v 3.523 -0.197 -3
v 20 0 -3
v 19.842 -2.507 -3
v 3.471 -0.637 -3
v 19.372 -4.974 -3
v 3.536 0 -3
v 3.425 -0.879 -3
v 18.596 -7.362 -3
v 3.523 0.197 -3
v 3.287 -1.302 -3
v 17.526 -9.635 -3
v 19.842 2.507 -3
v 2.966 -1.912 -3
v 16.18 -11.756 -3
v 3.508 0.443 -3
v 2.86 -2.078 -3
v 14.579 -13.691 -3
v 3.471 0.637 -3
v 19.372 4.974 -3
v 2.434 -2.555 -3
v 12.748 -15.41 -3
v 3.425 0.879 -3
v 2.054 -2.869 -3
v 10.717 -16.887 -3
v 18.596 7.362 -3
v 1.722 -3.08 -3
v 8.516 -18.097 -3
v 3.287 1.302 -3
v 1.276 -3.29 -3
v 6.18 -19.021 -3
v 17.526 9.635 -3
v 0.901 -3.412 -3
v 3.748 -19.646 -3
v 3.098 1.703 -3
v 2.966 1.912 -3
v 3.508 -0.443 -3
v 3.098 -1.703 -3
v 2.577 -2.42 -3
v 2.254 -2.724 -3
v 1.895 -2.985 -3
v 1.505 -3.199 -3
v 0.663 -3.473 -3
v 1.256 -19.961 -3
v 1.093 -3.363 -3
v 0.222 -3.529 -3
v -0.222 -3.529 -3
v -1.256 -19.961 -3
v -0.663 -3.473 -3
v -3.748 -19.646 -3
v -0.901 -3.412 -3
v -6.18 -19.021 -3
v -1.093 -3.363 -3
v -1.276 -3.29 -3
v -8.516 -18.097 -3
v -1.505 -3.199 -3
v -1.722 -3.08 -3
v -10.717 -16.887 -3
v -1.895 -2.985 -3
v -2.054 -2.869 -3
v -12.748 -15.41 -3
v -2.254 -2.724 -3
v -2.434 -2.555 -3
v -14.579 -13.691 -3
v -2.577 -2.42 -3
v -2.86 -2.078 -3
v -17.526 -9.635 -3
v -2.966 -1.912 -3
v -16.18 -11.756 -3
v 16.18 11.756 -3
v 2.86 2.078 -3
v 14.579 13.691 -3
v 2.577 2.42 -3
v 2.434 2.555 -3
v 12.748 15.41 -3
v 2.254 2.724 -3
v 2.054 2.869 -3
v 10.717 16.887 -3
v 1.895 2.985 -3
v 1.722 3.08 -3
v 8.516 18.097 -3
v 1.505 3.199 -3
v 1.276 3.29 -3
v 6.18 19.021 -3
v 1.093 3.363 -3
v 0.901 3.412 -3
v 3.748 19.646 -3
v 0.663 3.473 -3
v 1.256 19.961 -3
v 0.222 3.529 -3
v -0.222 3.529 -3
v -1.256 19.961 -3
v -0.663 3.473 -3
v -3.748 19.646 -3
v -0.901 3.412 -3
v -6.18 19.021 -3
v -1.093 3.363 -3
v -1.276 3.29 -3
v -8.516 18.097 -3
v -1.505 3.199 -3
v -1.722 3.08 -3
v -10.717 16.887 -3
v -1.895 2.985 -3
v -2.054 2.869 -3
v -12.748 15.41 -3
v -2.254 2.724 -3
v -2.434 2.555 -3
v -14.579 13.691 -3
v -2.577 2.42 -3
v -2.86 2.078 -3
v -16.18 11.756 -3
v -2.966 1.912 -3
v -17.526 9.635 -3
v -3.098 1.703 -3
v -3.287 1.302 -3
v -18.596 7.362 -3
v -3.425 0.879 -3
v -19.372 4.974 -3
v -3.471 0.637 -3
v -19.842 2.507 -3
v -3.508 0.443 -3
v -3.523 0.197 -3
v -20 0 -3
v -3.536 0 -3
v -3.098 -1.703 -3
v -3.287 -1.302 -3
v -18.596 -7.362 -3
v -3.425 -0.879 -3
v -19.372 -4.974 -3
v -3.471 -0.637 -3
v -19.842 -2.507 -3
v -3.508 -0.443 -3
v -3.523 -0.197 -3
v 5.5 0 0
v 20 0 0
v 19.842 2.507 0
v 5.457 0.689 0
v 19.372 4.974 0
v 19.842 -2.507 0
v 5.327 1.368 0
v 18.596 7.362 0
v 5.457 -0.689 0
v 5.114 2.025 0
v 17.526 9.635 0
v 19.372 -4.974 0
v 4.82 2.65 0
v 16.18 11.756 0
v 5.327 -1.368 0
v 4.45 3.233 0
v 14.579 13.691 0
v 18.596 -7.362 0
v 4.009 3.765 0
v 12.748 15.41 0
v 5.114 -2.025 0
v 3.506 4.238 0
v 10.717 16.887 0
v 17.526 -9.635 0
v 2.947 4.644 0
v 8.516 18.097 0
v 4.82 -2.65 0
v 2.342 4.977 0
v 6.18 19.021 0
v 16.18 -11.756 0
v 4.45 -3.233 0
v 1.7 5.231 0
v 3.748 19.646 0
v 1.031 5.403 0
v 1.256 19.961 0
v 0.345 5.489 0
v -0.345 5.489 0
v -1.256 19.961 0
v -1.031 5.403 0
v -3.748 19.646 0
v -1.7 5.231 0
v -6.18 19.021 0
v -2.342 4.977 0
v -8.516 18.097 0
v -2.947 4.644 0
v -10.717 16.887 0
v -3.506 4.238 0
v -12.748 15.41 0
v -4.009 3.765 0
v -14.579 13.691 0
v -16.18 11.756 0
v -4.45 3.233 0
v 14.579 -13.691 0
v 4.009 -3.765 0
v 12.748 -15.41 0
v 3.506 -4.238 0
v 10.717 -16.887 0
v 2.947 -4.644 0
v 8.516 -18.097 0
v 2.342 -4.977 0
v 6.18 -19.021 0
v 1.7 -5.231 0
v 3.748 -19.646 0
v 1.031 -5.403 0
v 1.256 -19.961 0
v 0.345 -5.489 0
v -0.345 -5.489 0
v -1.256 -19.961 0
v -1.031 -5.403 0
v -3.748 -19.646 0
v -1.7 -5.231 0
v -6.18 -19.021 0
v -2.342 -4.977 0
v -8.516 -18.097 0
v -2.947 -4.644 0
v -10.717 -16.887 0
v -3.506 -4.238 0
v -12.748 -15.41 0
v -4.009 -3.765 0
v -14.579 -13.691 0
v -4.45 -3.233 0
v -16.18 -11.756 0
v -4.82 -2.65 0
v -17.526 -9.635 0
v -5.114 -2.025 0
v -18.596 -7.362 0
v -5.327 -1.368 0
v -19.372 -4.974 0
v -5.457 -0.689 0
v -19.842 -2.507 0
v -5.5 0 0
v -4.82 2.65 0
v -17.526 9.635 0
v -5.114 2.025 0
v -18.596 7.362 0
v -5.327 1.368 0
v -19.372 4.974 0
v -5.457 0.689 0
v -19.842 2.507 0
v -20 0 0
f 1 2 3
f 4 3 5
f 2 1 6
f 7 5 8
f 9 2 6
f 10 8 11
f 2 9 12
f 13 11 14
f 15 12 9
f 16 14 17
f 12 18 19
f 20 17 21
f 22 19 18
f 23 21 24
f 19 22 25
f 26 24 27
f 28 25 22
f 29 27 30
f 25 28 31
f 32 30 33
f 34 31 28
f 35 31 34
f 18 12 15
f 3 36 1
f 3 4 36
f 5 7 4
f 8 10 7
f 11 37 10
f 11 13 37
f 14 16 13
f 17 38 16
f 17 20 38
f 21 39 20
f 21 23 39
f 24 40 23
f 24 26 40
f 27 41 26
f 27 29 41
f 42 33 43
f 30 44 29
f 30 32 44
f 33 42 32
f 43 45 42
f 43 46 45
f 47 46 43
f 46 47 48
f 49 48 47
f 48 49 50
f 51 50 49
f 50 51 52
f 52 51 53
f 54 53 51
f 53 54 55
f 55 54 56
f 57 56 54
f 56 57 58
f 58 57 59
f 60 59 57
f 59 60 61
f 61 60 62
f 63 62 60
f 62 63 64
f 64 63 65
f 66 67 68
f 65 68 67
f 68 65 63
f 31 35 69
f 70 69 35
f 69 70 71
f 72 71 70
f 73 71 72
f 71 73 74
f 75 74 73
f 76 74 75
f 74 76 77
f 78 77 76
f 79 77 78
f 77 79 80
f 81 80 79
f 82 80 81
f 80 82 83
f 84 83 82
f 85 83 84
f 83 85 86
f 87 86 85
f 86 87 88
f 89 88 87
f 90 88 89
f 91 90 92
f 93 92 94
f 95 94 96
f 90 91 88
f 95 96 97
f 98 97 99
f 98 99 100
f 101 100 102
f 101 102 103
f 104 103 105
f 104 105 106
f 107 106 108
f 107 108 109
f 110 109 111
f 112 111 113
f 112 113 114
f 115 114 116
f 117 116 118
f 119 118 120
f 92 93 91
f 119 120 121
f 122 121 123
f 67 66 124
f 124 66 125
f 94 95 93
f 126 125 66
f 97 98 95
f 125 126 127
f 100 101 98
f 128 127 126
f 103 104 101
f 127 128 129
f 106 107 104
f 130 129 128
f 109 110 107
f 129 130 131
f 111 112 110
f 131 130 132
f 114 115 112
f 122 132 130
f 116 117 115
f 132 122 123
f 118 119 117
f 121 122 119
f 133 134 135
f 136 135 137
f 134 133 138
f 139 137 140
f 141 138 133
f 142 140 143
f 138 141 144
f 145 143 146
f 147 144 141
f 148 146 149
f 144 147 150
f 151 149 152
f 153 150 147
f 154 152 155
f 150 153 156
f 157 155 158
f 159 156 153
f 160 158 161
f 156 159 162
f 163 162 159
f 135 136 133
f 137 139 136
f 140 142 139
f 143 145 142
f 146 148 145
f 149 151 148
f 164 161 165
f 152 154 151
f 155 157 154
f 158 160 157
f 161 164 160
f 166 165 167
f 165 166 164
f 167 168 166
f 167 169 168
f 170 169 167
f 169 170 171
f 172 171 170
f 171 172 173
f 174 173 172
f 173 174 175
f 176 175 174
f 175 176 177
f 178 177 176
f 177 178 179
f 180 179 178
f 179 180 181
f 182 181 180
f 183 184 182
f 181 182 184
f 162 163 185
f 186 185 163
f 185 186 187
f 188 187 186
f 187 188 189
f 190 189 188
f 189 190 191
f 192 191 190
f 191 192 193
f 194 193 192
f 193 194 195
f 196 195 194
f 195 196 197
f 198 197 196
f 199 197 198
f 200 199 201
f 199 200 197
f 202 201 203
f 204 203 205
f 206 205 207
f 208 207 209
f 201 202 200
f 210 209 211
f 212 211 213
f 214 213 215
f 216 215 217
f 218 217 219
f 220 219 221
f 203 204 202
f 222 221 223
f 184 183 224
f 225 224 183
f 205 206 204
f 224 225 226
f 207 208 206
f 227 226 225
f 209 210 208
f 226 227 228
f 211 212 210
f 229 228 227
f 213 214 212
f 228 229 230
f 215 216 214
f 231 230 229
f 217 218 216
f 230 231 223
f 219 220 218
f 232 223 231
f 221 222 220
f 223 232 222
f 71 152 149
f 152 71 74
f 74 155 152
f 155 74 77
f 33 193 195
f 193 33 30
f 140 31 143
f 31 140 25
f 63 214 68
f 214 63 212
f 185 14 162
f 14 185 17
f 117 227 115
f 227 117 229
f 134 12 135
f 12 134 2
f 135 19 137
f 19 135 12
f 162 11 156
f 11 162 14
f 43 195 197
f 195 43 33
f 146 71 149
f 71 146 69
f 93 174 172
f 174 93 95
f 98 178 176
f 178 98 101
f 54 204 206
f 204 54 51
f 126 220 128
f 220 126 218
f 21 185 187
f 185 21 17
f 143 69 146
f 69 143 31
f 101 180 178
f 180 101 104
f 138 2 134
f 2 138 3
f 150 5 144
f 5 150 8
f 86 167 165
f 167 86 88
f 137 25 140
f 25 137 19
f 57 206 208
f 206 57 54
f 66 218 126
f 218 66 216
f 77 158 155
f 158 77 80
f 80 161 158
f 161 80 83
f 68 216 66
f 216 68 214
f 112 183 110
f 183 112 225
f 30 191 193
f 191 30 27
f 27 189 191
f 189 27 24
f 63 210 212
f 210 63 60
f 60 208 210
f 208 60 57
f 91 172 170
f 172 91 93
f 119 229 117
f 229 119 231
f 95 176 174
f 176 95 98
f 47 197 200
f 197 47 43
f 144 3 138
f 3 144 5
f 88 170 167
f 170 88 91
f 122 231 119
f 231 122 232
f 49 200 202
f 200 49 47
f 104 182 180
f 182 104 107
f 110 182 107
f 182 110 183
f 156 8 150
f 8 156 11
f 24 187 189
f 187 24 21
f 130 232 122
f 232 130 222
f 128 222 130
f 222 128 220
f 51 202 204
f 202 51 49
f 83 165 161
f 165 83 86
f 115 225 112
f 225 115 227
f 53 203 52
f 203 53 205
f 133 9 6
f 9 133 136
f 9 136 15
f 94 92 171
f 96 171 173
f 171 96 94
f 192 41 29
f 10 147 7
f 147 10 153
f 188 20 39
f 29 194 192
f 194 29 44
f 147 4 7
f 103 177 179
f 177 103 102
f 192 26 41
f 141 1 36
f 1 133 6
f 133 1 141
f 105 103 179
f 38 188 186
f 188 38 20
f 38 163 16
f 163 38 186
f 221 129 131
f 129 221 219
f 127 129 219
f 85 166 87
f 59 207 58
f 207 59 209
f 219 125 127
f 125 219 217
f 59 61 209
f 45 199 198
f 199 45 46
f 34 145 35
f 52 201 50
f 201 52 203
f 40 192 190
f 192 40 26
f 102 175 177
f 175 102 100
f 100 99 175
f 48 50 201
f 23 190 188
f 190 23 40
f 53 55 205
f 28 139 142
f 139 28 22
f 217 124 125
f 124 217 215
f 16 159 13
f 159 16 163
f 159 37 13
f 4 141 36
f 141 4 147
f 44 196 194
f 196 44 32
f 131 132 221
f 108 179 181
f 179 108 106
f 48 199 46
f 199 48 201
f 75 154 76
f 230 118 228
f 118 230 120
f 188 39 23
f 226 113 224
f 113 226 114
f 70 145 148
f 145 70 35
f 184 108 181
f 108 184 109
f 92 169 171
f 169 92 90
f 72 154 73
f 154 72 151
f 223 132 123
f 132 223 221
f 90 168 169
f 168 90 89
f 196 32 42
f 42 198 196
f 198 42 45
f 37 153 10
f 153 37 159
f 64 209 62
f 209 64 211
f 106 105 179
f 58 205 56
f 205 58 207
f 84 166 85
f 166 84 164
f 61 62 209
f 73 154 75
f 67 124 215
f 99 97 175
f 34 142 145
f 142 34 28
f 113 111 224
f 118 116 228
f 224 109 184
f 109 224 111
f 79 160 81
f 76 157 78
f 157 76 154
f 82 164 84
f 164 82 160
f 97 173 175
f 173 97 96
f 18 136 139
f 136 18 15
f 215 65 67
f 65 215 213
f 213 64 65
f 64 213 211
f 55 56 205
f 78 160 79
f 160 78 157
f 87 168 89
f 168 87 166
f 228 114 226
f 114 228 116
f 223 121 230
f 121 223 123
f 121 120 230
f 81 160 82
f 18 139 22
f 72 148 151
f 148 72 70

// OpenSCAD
$fn = 50;


difference() {
	union() {
		translate(v = [0, 0, -3.0000000000]) {
			cylinder(h = 3, r = 10.0000000000);
		}
		translate(v = [0, 0, -3.0000000000]) {
			cylinder(h = 3, r = 20.0000000000);
		}
	}
	union() {
		translate(v = [0, 0, 0]) {
			rotate(a = [0, 0, 0]) {
				difference() {
					union() {
						#translate(v = [0, 0, -3.0000000000]) {
							cylinder(h = 3, r = 2.2500000000);
						}
						#translate(v = [0, 0, -4.2000000000]) {
							cylinder(h = 4.2000000000, r = 10.0000000000, r1 = 2.7500000000, r2 = 5.5000000000);
						}
						#translate(v = [0, 0, -3.0000000000]) {
							cylinder(h = 3, r = 2.7500000000);
						}
						#translate(v = [0, 0, -3.0000000000]) {
							cylinder(h = 3, r = 2.2500000000);
						}
					}
					union();
				}
			}
		}
	}
}
